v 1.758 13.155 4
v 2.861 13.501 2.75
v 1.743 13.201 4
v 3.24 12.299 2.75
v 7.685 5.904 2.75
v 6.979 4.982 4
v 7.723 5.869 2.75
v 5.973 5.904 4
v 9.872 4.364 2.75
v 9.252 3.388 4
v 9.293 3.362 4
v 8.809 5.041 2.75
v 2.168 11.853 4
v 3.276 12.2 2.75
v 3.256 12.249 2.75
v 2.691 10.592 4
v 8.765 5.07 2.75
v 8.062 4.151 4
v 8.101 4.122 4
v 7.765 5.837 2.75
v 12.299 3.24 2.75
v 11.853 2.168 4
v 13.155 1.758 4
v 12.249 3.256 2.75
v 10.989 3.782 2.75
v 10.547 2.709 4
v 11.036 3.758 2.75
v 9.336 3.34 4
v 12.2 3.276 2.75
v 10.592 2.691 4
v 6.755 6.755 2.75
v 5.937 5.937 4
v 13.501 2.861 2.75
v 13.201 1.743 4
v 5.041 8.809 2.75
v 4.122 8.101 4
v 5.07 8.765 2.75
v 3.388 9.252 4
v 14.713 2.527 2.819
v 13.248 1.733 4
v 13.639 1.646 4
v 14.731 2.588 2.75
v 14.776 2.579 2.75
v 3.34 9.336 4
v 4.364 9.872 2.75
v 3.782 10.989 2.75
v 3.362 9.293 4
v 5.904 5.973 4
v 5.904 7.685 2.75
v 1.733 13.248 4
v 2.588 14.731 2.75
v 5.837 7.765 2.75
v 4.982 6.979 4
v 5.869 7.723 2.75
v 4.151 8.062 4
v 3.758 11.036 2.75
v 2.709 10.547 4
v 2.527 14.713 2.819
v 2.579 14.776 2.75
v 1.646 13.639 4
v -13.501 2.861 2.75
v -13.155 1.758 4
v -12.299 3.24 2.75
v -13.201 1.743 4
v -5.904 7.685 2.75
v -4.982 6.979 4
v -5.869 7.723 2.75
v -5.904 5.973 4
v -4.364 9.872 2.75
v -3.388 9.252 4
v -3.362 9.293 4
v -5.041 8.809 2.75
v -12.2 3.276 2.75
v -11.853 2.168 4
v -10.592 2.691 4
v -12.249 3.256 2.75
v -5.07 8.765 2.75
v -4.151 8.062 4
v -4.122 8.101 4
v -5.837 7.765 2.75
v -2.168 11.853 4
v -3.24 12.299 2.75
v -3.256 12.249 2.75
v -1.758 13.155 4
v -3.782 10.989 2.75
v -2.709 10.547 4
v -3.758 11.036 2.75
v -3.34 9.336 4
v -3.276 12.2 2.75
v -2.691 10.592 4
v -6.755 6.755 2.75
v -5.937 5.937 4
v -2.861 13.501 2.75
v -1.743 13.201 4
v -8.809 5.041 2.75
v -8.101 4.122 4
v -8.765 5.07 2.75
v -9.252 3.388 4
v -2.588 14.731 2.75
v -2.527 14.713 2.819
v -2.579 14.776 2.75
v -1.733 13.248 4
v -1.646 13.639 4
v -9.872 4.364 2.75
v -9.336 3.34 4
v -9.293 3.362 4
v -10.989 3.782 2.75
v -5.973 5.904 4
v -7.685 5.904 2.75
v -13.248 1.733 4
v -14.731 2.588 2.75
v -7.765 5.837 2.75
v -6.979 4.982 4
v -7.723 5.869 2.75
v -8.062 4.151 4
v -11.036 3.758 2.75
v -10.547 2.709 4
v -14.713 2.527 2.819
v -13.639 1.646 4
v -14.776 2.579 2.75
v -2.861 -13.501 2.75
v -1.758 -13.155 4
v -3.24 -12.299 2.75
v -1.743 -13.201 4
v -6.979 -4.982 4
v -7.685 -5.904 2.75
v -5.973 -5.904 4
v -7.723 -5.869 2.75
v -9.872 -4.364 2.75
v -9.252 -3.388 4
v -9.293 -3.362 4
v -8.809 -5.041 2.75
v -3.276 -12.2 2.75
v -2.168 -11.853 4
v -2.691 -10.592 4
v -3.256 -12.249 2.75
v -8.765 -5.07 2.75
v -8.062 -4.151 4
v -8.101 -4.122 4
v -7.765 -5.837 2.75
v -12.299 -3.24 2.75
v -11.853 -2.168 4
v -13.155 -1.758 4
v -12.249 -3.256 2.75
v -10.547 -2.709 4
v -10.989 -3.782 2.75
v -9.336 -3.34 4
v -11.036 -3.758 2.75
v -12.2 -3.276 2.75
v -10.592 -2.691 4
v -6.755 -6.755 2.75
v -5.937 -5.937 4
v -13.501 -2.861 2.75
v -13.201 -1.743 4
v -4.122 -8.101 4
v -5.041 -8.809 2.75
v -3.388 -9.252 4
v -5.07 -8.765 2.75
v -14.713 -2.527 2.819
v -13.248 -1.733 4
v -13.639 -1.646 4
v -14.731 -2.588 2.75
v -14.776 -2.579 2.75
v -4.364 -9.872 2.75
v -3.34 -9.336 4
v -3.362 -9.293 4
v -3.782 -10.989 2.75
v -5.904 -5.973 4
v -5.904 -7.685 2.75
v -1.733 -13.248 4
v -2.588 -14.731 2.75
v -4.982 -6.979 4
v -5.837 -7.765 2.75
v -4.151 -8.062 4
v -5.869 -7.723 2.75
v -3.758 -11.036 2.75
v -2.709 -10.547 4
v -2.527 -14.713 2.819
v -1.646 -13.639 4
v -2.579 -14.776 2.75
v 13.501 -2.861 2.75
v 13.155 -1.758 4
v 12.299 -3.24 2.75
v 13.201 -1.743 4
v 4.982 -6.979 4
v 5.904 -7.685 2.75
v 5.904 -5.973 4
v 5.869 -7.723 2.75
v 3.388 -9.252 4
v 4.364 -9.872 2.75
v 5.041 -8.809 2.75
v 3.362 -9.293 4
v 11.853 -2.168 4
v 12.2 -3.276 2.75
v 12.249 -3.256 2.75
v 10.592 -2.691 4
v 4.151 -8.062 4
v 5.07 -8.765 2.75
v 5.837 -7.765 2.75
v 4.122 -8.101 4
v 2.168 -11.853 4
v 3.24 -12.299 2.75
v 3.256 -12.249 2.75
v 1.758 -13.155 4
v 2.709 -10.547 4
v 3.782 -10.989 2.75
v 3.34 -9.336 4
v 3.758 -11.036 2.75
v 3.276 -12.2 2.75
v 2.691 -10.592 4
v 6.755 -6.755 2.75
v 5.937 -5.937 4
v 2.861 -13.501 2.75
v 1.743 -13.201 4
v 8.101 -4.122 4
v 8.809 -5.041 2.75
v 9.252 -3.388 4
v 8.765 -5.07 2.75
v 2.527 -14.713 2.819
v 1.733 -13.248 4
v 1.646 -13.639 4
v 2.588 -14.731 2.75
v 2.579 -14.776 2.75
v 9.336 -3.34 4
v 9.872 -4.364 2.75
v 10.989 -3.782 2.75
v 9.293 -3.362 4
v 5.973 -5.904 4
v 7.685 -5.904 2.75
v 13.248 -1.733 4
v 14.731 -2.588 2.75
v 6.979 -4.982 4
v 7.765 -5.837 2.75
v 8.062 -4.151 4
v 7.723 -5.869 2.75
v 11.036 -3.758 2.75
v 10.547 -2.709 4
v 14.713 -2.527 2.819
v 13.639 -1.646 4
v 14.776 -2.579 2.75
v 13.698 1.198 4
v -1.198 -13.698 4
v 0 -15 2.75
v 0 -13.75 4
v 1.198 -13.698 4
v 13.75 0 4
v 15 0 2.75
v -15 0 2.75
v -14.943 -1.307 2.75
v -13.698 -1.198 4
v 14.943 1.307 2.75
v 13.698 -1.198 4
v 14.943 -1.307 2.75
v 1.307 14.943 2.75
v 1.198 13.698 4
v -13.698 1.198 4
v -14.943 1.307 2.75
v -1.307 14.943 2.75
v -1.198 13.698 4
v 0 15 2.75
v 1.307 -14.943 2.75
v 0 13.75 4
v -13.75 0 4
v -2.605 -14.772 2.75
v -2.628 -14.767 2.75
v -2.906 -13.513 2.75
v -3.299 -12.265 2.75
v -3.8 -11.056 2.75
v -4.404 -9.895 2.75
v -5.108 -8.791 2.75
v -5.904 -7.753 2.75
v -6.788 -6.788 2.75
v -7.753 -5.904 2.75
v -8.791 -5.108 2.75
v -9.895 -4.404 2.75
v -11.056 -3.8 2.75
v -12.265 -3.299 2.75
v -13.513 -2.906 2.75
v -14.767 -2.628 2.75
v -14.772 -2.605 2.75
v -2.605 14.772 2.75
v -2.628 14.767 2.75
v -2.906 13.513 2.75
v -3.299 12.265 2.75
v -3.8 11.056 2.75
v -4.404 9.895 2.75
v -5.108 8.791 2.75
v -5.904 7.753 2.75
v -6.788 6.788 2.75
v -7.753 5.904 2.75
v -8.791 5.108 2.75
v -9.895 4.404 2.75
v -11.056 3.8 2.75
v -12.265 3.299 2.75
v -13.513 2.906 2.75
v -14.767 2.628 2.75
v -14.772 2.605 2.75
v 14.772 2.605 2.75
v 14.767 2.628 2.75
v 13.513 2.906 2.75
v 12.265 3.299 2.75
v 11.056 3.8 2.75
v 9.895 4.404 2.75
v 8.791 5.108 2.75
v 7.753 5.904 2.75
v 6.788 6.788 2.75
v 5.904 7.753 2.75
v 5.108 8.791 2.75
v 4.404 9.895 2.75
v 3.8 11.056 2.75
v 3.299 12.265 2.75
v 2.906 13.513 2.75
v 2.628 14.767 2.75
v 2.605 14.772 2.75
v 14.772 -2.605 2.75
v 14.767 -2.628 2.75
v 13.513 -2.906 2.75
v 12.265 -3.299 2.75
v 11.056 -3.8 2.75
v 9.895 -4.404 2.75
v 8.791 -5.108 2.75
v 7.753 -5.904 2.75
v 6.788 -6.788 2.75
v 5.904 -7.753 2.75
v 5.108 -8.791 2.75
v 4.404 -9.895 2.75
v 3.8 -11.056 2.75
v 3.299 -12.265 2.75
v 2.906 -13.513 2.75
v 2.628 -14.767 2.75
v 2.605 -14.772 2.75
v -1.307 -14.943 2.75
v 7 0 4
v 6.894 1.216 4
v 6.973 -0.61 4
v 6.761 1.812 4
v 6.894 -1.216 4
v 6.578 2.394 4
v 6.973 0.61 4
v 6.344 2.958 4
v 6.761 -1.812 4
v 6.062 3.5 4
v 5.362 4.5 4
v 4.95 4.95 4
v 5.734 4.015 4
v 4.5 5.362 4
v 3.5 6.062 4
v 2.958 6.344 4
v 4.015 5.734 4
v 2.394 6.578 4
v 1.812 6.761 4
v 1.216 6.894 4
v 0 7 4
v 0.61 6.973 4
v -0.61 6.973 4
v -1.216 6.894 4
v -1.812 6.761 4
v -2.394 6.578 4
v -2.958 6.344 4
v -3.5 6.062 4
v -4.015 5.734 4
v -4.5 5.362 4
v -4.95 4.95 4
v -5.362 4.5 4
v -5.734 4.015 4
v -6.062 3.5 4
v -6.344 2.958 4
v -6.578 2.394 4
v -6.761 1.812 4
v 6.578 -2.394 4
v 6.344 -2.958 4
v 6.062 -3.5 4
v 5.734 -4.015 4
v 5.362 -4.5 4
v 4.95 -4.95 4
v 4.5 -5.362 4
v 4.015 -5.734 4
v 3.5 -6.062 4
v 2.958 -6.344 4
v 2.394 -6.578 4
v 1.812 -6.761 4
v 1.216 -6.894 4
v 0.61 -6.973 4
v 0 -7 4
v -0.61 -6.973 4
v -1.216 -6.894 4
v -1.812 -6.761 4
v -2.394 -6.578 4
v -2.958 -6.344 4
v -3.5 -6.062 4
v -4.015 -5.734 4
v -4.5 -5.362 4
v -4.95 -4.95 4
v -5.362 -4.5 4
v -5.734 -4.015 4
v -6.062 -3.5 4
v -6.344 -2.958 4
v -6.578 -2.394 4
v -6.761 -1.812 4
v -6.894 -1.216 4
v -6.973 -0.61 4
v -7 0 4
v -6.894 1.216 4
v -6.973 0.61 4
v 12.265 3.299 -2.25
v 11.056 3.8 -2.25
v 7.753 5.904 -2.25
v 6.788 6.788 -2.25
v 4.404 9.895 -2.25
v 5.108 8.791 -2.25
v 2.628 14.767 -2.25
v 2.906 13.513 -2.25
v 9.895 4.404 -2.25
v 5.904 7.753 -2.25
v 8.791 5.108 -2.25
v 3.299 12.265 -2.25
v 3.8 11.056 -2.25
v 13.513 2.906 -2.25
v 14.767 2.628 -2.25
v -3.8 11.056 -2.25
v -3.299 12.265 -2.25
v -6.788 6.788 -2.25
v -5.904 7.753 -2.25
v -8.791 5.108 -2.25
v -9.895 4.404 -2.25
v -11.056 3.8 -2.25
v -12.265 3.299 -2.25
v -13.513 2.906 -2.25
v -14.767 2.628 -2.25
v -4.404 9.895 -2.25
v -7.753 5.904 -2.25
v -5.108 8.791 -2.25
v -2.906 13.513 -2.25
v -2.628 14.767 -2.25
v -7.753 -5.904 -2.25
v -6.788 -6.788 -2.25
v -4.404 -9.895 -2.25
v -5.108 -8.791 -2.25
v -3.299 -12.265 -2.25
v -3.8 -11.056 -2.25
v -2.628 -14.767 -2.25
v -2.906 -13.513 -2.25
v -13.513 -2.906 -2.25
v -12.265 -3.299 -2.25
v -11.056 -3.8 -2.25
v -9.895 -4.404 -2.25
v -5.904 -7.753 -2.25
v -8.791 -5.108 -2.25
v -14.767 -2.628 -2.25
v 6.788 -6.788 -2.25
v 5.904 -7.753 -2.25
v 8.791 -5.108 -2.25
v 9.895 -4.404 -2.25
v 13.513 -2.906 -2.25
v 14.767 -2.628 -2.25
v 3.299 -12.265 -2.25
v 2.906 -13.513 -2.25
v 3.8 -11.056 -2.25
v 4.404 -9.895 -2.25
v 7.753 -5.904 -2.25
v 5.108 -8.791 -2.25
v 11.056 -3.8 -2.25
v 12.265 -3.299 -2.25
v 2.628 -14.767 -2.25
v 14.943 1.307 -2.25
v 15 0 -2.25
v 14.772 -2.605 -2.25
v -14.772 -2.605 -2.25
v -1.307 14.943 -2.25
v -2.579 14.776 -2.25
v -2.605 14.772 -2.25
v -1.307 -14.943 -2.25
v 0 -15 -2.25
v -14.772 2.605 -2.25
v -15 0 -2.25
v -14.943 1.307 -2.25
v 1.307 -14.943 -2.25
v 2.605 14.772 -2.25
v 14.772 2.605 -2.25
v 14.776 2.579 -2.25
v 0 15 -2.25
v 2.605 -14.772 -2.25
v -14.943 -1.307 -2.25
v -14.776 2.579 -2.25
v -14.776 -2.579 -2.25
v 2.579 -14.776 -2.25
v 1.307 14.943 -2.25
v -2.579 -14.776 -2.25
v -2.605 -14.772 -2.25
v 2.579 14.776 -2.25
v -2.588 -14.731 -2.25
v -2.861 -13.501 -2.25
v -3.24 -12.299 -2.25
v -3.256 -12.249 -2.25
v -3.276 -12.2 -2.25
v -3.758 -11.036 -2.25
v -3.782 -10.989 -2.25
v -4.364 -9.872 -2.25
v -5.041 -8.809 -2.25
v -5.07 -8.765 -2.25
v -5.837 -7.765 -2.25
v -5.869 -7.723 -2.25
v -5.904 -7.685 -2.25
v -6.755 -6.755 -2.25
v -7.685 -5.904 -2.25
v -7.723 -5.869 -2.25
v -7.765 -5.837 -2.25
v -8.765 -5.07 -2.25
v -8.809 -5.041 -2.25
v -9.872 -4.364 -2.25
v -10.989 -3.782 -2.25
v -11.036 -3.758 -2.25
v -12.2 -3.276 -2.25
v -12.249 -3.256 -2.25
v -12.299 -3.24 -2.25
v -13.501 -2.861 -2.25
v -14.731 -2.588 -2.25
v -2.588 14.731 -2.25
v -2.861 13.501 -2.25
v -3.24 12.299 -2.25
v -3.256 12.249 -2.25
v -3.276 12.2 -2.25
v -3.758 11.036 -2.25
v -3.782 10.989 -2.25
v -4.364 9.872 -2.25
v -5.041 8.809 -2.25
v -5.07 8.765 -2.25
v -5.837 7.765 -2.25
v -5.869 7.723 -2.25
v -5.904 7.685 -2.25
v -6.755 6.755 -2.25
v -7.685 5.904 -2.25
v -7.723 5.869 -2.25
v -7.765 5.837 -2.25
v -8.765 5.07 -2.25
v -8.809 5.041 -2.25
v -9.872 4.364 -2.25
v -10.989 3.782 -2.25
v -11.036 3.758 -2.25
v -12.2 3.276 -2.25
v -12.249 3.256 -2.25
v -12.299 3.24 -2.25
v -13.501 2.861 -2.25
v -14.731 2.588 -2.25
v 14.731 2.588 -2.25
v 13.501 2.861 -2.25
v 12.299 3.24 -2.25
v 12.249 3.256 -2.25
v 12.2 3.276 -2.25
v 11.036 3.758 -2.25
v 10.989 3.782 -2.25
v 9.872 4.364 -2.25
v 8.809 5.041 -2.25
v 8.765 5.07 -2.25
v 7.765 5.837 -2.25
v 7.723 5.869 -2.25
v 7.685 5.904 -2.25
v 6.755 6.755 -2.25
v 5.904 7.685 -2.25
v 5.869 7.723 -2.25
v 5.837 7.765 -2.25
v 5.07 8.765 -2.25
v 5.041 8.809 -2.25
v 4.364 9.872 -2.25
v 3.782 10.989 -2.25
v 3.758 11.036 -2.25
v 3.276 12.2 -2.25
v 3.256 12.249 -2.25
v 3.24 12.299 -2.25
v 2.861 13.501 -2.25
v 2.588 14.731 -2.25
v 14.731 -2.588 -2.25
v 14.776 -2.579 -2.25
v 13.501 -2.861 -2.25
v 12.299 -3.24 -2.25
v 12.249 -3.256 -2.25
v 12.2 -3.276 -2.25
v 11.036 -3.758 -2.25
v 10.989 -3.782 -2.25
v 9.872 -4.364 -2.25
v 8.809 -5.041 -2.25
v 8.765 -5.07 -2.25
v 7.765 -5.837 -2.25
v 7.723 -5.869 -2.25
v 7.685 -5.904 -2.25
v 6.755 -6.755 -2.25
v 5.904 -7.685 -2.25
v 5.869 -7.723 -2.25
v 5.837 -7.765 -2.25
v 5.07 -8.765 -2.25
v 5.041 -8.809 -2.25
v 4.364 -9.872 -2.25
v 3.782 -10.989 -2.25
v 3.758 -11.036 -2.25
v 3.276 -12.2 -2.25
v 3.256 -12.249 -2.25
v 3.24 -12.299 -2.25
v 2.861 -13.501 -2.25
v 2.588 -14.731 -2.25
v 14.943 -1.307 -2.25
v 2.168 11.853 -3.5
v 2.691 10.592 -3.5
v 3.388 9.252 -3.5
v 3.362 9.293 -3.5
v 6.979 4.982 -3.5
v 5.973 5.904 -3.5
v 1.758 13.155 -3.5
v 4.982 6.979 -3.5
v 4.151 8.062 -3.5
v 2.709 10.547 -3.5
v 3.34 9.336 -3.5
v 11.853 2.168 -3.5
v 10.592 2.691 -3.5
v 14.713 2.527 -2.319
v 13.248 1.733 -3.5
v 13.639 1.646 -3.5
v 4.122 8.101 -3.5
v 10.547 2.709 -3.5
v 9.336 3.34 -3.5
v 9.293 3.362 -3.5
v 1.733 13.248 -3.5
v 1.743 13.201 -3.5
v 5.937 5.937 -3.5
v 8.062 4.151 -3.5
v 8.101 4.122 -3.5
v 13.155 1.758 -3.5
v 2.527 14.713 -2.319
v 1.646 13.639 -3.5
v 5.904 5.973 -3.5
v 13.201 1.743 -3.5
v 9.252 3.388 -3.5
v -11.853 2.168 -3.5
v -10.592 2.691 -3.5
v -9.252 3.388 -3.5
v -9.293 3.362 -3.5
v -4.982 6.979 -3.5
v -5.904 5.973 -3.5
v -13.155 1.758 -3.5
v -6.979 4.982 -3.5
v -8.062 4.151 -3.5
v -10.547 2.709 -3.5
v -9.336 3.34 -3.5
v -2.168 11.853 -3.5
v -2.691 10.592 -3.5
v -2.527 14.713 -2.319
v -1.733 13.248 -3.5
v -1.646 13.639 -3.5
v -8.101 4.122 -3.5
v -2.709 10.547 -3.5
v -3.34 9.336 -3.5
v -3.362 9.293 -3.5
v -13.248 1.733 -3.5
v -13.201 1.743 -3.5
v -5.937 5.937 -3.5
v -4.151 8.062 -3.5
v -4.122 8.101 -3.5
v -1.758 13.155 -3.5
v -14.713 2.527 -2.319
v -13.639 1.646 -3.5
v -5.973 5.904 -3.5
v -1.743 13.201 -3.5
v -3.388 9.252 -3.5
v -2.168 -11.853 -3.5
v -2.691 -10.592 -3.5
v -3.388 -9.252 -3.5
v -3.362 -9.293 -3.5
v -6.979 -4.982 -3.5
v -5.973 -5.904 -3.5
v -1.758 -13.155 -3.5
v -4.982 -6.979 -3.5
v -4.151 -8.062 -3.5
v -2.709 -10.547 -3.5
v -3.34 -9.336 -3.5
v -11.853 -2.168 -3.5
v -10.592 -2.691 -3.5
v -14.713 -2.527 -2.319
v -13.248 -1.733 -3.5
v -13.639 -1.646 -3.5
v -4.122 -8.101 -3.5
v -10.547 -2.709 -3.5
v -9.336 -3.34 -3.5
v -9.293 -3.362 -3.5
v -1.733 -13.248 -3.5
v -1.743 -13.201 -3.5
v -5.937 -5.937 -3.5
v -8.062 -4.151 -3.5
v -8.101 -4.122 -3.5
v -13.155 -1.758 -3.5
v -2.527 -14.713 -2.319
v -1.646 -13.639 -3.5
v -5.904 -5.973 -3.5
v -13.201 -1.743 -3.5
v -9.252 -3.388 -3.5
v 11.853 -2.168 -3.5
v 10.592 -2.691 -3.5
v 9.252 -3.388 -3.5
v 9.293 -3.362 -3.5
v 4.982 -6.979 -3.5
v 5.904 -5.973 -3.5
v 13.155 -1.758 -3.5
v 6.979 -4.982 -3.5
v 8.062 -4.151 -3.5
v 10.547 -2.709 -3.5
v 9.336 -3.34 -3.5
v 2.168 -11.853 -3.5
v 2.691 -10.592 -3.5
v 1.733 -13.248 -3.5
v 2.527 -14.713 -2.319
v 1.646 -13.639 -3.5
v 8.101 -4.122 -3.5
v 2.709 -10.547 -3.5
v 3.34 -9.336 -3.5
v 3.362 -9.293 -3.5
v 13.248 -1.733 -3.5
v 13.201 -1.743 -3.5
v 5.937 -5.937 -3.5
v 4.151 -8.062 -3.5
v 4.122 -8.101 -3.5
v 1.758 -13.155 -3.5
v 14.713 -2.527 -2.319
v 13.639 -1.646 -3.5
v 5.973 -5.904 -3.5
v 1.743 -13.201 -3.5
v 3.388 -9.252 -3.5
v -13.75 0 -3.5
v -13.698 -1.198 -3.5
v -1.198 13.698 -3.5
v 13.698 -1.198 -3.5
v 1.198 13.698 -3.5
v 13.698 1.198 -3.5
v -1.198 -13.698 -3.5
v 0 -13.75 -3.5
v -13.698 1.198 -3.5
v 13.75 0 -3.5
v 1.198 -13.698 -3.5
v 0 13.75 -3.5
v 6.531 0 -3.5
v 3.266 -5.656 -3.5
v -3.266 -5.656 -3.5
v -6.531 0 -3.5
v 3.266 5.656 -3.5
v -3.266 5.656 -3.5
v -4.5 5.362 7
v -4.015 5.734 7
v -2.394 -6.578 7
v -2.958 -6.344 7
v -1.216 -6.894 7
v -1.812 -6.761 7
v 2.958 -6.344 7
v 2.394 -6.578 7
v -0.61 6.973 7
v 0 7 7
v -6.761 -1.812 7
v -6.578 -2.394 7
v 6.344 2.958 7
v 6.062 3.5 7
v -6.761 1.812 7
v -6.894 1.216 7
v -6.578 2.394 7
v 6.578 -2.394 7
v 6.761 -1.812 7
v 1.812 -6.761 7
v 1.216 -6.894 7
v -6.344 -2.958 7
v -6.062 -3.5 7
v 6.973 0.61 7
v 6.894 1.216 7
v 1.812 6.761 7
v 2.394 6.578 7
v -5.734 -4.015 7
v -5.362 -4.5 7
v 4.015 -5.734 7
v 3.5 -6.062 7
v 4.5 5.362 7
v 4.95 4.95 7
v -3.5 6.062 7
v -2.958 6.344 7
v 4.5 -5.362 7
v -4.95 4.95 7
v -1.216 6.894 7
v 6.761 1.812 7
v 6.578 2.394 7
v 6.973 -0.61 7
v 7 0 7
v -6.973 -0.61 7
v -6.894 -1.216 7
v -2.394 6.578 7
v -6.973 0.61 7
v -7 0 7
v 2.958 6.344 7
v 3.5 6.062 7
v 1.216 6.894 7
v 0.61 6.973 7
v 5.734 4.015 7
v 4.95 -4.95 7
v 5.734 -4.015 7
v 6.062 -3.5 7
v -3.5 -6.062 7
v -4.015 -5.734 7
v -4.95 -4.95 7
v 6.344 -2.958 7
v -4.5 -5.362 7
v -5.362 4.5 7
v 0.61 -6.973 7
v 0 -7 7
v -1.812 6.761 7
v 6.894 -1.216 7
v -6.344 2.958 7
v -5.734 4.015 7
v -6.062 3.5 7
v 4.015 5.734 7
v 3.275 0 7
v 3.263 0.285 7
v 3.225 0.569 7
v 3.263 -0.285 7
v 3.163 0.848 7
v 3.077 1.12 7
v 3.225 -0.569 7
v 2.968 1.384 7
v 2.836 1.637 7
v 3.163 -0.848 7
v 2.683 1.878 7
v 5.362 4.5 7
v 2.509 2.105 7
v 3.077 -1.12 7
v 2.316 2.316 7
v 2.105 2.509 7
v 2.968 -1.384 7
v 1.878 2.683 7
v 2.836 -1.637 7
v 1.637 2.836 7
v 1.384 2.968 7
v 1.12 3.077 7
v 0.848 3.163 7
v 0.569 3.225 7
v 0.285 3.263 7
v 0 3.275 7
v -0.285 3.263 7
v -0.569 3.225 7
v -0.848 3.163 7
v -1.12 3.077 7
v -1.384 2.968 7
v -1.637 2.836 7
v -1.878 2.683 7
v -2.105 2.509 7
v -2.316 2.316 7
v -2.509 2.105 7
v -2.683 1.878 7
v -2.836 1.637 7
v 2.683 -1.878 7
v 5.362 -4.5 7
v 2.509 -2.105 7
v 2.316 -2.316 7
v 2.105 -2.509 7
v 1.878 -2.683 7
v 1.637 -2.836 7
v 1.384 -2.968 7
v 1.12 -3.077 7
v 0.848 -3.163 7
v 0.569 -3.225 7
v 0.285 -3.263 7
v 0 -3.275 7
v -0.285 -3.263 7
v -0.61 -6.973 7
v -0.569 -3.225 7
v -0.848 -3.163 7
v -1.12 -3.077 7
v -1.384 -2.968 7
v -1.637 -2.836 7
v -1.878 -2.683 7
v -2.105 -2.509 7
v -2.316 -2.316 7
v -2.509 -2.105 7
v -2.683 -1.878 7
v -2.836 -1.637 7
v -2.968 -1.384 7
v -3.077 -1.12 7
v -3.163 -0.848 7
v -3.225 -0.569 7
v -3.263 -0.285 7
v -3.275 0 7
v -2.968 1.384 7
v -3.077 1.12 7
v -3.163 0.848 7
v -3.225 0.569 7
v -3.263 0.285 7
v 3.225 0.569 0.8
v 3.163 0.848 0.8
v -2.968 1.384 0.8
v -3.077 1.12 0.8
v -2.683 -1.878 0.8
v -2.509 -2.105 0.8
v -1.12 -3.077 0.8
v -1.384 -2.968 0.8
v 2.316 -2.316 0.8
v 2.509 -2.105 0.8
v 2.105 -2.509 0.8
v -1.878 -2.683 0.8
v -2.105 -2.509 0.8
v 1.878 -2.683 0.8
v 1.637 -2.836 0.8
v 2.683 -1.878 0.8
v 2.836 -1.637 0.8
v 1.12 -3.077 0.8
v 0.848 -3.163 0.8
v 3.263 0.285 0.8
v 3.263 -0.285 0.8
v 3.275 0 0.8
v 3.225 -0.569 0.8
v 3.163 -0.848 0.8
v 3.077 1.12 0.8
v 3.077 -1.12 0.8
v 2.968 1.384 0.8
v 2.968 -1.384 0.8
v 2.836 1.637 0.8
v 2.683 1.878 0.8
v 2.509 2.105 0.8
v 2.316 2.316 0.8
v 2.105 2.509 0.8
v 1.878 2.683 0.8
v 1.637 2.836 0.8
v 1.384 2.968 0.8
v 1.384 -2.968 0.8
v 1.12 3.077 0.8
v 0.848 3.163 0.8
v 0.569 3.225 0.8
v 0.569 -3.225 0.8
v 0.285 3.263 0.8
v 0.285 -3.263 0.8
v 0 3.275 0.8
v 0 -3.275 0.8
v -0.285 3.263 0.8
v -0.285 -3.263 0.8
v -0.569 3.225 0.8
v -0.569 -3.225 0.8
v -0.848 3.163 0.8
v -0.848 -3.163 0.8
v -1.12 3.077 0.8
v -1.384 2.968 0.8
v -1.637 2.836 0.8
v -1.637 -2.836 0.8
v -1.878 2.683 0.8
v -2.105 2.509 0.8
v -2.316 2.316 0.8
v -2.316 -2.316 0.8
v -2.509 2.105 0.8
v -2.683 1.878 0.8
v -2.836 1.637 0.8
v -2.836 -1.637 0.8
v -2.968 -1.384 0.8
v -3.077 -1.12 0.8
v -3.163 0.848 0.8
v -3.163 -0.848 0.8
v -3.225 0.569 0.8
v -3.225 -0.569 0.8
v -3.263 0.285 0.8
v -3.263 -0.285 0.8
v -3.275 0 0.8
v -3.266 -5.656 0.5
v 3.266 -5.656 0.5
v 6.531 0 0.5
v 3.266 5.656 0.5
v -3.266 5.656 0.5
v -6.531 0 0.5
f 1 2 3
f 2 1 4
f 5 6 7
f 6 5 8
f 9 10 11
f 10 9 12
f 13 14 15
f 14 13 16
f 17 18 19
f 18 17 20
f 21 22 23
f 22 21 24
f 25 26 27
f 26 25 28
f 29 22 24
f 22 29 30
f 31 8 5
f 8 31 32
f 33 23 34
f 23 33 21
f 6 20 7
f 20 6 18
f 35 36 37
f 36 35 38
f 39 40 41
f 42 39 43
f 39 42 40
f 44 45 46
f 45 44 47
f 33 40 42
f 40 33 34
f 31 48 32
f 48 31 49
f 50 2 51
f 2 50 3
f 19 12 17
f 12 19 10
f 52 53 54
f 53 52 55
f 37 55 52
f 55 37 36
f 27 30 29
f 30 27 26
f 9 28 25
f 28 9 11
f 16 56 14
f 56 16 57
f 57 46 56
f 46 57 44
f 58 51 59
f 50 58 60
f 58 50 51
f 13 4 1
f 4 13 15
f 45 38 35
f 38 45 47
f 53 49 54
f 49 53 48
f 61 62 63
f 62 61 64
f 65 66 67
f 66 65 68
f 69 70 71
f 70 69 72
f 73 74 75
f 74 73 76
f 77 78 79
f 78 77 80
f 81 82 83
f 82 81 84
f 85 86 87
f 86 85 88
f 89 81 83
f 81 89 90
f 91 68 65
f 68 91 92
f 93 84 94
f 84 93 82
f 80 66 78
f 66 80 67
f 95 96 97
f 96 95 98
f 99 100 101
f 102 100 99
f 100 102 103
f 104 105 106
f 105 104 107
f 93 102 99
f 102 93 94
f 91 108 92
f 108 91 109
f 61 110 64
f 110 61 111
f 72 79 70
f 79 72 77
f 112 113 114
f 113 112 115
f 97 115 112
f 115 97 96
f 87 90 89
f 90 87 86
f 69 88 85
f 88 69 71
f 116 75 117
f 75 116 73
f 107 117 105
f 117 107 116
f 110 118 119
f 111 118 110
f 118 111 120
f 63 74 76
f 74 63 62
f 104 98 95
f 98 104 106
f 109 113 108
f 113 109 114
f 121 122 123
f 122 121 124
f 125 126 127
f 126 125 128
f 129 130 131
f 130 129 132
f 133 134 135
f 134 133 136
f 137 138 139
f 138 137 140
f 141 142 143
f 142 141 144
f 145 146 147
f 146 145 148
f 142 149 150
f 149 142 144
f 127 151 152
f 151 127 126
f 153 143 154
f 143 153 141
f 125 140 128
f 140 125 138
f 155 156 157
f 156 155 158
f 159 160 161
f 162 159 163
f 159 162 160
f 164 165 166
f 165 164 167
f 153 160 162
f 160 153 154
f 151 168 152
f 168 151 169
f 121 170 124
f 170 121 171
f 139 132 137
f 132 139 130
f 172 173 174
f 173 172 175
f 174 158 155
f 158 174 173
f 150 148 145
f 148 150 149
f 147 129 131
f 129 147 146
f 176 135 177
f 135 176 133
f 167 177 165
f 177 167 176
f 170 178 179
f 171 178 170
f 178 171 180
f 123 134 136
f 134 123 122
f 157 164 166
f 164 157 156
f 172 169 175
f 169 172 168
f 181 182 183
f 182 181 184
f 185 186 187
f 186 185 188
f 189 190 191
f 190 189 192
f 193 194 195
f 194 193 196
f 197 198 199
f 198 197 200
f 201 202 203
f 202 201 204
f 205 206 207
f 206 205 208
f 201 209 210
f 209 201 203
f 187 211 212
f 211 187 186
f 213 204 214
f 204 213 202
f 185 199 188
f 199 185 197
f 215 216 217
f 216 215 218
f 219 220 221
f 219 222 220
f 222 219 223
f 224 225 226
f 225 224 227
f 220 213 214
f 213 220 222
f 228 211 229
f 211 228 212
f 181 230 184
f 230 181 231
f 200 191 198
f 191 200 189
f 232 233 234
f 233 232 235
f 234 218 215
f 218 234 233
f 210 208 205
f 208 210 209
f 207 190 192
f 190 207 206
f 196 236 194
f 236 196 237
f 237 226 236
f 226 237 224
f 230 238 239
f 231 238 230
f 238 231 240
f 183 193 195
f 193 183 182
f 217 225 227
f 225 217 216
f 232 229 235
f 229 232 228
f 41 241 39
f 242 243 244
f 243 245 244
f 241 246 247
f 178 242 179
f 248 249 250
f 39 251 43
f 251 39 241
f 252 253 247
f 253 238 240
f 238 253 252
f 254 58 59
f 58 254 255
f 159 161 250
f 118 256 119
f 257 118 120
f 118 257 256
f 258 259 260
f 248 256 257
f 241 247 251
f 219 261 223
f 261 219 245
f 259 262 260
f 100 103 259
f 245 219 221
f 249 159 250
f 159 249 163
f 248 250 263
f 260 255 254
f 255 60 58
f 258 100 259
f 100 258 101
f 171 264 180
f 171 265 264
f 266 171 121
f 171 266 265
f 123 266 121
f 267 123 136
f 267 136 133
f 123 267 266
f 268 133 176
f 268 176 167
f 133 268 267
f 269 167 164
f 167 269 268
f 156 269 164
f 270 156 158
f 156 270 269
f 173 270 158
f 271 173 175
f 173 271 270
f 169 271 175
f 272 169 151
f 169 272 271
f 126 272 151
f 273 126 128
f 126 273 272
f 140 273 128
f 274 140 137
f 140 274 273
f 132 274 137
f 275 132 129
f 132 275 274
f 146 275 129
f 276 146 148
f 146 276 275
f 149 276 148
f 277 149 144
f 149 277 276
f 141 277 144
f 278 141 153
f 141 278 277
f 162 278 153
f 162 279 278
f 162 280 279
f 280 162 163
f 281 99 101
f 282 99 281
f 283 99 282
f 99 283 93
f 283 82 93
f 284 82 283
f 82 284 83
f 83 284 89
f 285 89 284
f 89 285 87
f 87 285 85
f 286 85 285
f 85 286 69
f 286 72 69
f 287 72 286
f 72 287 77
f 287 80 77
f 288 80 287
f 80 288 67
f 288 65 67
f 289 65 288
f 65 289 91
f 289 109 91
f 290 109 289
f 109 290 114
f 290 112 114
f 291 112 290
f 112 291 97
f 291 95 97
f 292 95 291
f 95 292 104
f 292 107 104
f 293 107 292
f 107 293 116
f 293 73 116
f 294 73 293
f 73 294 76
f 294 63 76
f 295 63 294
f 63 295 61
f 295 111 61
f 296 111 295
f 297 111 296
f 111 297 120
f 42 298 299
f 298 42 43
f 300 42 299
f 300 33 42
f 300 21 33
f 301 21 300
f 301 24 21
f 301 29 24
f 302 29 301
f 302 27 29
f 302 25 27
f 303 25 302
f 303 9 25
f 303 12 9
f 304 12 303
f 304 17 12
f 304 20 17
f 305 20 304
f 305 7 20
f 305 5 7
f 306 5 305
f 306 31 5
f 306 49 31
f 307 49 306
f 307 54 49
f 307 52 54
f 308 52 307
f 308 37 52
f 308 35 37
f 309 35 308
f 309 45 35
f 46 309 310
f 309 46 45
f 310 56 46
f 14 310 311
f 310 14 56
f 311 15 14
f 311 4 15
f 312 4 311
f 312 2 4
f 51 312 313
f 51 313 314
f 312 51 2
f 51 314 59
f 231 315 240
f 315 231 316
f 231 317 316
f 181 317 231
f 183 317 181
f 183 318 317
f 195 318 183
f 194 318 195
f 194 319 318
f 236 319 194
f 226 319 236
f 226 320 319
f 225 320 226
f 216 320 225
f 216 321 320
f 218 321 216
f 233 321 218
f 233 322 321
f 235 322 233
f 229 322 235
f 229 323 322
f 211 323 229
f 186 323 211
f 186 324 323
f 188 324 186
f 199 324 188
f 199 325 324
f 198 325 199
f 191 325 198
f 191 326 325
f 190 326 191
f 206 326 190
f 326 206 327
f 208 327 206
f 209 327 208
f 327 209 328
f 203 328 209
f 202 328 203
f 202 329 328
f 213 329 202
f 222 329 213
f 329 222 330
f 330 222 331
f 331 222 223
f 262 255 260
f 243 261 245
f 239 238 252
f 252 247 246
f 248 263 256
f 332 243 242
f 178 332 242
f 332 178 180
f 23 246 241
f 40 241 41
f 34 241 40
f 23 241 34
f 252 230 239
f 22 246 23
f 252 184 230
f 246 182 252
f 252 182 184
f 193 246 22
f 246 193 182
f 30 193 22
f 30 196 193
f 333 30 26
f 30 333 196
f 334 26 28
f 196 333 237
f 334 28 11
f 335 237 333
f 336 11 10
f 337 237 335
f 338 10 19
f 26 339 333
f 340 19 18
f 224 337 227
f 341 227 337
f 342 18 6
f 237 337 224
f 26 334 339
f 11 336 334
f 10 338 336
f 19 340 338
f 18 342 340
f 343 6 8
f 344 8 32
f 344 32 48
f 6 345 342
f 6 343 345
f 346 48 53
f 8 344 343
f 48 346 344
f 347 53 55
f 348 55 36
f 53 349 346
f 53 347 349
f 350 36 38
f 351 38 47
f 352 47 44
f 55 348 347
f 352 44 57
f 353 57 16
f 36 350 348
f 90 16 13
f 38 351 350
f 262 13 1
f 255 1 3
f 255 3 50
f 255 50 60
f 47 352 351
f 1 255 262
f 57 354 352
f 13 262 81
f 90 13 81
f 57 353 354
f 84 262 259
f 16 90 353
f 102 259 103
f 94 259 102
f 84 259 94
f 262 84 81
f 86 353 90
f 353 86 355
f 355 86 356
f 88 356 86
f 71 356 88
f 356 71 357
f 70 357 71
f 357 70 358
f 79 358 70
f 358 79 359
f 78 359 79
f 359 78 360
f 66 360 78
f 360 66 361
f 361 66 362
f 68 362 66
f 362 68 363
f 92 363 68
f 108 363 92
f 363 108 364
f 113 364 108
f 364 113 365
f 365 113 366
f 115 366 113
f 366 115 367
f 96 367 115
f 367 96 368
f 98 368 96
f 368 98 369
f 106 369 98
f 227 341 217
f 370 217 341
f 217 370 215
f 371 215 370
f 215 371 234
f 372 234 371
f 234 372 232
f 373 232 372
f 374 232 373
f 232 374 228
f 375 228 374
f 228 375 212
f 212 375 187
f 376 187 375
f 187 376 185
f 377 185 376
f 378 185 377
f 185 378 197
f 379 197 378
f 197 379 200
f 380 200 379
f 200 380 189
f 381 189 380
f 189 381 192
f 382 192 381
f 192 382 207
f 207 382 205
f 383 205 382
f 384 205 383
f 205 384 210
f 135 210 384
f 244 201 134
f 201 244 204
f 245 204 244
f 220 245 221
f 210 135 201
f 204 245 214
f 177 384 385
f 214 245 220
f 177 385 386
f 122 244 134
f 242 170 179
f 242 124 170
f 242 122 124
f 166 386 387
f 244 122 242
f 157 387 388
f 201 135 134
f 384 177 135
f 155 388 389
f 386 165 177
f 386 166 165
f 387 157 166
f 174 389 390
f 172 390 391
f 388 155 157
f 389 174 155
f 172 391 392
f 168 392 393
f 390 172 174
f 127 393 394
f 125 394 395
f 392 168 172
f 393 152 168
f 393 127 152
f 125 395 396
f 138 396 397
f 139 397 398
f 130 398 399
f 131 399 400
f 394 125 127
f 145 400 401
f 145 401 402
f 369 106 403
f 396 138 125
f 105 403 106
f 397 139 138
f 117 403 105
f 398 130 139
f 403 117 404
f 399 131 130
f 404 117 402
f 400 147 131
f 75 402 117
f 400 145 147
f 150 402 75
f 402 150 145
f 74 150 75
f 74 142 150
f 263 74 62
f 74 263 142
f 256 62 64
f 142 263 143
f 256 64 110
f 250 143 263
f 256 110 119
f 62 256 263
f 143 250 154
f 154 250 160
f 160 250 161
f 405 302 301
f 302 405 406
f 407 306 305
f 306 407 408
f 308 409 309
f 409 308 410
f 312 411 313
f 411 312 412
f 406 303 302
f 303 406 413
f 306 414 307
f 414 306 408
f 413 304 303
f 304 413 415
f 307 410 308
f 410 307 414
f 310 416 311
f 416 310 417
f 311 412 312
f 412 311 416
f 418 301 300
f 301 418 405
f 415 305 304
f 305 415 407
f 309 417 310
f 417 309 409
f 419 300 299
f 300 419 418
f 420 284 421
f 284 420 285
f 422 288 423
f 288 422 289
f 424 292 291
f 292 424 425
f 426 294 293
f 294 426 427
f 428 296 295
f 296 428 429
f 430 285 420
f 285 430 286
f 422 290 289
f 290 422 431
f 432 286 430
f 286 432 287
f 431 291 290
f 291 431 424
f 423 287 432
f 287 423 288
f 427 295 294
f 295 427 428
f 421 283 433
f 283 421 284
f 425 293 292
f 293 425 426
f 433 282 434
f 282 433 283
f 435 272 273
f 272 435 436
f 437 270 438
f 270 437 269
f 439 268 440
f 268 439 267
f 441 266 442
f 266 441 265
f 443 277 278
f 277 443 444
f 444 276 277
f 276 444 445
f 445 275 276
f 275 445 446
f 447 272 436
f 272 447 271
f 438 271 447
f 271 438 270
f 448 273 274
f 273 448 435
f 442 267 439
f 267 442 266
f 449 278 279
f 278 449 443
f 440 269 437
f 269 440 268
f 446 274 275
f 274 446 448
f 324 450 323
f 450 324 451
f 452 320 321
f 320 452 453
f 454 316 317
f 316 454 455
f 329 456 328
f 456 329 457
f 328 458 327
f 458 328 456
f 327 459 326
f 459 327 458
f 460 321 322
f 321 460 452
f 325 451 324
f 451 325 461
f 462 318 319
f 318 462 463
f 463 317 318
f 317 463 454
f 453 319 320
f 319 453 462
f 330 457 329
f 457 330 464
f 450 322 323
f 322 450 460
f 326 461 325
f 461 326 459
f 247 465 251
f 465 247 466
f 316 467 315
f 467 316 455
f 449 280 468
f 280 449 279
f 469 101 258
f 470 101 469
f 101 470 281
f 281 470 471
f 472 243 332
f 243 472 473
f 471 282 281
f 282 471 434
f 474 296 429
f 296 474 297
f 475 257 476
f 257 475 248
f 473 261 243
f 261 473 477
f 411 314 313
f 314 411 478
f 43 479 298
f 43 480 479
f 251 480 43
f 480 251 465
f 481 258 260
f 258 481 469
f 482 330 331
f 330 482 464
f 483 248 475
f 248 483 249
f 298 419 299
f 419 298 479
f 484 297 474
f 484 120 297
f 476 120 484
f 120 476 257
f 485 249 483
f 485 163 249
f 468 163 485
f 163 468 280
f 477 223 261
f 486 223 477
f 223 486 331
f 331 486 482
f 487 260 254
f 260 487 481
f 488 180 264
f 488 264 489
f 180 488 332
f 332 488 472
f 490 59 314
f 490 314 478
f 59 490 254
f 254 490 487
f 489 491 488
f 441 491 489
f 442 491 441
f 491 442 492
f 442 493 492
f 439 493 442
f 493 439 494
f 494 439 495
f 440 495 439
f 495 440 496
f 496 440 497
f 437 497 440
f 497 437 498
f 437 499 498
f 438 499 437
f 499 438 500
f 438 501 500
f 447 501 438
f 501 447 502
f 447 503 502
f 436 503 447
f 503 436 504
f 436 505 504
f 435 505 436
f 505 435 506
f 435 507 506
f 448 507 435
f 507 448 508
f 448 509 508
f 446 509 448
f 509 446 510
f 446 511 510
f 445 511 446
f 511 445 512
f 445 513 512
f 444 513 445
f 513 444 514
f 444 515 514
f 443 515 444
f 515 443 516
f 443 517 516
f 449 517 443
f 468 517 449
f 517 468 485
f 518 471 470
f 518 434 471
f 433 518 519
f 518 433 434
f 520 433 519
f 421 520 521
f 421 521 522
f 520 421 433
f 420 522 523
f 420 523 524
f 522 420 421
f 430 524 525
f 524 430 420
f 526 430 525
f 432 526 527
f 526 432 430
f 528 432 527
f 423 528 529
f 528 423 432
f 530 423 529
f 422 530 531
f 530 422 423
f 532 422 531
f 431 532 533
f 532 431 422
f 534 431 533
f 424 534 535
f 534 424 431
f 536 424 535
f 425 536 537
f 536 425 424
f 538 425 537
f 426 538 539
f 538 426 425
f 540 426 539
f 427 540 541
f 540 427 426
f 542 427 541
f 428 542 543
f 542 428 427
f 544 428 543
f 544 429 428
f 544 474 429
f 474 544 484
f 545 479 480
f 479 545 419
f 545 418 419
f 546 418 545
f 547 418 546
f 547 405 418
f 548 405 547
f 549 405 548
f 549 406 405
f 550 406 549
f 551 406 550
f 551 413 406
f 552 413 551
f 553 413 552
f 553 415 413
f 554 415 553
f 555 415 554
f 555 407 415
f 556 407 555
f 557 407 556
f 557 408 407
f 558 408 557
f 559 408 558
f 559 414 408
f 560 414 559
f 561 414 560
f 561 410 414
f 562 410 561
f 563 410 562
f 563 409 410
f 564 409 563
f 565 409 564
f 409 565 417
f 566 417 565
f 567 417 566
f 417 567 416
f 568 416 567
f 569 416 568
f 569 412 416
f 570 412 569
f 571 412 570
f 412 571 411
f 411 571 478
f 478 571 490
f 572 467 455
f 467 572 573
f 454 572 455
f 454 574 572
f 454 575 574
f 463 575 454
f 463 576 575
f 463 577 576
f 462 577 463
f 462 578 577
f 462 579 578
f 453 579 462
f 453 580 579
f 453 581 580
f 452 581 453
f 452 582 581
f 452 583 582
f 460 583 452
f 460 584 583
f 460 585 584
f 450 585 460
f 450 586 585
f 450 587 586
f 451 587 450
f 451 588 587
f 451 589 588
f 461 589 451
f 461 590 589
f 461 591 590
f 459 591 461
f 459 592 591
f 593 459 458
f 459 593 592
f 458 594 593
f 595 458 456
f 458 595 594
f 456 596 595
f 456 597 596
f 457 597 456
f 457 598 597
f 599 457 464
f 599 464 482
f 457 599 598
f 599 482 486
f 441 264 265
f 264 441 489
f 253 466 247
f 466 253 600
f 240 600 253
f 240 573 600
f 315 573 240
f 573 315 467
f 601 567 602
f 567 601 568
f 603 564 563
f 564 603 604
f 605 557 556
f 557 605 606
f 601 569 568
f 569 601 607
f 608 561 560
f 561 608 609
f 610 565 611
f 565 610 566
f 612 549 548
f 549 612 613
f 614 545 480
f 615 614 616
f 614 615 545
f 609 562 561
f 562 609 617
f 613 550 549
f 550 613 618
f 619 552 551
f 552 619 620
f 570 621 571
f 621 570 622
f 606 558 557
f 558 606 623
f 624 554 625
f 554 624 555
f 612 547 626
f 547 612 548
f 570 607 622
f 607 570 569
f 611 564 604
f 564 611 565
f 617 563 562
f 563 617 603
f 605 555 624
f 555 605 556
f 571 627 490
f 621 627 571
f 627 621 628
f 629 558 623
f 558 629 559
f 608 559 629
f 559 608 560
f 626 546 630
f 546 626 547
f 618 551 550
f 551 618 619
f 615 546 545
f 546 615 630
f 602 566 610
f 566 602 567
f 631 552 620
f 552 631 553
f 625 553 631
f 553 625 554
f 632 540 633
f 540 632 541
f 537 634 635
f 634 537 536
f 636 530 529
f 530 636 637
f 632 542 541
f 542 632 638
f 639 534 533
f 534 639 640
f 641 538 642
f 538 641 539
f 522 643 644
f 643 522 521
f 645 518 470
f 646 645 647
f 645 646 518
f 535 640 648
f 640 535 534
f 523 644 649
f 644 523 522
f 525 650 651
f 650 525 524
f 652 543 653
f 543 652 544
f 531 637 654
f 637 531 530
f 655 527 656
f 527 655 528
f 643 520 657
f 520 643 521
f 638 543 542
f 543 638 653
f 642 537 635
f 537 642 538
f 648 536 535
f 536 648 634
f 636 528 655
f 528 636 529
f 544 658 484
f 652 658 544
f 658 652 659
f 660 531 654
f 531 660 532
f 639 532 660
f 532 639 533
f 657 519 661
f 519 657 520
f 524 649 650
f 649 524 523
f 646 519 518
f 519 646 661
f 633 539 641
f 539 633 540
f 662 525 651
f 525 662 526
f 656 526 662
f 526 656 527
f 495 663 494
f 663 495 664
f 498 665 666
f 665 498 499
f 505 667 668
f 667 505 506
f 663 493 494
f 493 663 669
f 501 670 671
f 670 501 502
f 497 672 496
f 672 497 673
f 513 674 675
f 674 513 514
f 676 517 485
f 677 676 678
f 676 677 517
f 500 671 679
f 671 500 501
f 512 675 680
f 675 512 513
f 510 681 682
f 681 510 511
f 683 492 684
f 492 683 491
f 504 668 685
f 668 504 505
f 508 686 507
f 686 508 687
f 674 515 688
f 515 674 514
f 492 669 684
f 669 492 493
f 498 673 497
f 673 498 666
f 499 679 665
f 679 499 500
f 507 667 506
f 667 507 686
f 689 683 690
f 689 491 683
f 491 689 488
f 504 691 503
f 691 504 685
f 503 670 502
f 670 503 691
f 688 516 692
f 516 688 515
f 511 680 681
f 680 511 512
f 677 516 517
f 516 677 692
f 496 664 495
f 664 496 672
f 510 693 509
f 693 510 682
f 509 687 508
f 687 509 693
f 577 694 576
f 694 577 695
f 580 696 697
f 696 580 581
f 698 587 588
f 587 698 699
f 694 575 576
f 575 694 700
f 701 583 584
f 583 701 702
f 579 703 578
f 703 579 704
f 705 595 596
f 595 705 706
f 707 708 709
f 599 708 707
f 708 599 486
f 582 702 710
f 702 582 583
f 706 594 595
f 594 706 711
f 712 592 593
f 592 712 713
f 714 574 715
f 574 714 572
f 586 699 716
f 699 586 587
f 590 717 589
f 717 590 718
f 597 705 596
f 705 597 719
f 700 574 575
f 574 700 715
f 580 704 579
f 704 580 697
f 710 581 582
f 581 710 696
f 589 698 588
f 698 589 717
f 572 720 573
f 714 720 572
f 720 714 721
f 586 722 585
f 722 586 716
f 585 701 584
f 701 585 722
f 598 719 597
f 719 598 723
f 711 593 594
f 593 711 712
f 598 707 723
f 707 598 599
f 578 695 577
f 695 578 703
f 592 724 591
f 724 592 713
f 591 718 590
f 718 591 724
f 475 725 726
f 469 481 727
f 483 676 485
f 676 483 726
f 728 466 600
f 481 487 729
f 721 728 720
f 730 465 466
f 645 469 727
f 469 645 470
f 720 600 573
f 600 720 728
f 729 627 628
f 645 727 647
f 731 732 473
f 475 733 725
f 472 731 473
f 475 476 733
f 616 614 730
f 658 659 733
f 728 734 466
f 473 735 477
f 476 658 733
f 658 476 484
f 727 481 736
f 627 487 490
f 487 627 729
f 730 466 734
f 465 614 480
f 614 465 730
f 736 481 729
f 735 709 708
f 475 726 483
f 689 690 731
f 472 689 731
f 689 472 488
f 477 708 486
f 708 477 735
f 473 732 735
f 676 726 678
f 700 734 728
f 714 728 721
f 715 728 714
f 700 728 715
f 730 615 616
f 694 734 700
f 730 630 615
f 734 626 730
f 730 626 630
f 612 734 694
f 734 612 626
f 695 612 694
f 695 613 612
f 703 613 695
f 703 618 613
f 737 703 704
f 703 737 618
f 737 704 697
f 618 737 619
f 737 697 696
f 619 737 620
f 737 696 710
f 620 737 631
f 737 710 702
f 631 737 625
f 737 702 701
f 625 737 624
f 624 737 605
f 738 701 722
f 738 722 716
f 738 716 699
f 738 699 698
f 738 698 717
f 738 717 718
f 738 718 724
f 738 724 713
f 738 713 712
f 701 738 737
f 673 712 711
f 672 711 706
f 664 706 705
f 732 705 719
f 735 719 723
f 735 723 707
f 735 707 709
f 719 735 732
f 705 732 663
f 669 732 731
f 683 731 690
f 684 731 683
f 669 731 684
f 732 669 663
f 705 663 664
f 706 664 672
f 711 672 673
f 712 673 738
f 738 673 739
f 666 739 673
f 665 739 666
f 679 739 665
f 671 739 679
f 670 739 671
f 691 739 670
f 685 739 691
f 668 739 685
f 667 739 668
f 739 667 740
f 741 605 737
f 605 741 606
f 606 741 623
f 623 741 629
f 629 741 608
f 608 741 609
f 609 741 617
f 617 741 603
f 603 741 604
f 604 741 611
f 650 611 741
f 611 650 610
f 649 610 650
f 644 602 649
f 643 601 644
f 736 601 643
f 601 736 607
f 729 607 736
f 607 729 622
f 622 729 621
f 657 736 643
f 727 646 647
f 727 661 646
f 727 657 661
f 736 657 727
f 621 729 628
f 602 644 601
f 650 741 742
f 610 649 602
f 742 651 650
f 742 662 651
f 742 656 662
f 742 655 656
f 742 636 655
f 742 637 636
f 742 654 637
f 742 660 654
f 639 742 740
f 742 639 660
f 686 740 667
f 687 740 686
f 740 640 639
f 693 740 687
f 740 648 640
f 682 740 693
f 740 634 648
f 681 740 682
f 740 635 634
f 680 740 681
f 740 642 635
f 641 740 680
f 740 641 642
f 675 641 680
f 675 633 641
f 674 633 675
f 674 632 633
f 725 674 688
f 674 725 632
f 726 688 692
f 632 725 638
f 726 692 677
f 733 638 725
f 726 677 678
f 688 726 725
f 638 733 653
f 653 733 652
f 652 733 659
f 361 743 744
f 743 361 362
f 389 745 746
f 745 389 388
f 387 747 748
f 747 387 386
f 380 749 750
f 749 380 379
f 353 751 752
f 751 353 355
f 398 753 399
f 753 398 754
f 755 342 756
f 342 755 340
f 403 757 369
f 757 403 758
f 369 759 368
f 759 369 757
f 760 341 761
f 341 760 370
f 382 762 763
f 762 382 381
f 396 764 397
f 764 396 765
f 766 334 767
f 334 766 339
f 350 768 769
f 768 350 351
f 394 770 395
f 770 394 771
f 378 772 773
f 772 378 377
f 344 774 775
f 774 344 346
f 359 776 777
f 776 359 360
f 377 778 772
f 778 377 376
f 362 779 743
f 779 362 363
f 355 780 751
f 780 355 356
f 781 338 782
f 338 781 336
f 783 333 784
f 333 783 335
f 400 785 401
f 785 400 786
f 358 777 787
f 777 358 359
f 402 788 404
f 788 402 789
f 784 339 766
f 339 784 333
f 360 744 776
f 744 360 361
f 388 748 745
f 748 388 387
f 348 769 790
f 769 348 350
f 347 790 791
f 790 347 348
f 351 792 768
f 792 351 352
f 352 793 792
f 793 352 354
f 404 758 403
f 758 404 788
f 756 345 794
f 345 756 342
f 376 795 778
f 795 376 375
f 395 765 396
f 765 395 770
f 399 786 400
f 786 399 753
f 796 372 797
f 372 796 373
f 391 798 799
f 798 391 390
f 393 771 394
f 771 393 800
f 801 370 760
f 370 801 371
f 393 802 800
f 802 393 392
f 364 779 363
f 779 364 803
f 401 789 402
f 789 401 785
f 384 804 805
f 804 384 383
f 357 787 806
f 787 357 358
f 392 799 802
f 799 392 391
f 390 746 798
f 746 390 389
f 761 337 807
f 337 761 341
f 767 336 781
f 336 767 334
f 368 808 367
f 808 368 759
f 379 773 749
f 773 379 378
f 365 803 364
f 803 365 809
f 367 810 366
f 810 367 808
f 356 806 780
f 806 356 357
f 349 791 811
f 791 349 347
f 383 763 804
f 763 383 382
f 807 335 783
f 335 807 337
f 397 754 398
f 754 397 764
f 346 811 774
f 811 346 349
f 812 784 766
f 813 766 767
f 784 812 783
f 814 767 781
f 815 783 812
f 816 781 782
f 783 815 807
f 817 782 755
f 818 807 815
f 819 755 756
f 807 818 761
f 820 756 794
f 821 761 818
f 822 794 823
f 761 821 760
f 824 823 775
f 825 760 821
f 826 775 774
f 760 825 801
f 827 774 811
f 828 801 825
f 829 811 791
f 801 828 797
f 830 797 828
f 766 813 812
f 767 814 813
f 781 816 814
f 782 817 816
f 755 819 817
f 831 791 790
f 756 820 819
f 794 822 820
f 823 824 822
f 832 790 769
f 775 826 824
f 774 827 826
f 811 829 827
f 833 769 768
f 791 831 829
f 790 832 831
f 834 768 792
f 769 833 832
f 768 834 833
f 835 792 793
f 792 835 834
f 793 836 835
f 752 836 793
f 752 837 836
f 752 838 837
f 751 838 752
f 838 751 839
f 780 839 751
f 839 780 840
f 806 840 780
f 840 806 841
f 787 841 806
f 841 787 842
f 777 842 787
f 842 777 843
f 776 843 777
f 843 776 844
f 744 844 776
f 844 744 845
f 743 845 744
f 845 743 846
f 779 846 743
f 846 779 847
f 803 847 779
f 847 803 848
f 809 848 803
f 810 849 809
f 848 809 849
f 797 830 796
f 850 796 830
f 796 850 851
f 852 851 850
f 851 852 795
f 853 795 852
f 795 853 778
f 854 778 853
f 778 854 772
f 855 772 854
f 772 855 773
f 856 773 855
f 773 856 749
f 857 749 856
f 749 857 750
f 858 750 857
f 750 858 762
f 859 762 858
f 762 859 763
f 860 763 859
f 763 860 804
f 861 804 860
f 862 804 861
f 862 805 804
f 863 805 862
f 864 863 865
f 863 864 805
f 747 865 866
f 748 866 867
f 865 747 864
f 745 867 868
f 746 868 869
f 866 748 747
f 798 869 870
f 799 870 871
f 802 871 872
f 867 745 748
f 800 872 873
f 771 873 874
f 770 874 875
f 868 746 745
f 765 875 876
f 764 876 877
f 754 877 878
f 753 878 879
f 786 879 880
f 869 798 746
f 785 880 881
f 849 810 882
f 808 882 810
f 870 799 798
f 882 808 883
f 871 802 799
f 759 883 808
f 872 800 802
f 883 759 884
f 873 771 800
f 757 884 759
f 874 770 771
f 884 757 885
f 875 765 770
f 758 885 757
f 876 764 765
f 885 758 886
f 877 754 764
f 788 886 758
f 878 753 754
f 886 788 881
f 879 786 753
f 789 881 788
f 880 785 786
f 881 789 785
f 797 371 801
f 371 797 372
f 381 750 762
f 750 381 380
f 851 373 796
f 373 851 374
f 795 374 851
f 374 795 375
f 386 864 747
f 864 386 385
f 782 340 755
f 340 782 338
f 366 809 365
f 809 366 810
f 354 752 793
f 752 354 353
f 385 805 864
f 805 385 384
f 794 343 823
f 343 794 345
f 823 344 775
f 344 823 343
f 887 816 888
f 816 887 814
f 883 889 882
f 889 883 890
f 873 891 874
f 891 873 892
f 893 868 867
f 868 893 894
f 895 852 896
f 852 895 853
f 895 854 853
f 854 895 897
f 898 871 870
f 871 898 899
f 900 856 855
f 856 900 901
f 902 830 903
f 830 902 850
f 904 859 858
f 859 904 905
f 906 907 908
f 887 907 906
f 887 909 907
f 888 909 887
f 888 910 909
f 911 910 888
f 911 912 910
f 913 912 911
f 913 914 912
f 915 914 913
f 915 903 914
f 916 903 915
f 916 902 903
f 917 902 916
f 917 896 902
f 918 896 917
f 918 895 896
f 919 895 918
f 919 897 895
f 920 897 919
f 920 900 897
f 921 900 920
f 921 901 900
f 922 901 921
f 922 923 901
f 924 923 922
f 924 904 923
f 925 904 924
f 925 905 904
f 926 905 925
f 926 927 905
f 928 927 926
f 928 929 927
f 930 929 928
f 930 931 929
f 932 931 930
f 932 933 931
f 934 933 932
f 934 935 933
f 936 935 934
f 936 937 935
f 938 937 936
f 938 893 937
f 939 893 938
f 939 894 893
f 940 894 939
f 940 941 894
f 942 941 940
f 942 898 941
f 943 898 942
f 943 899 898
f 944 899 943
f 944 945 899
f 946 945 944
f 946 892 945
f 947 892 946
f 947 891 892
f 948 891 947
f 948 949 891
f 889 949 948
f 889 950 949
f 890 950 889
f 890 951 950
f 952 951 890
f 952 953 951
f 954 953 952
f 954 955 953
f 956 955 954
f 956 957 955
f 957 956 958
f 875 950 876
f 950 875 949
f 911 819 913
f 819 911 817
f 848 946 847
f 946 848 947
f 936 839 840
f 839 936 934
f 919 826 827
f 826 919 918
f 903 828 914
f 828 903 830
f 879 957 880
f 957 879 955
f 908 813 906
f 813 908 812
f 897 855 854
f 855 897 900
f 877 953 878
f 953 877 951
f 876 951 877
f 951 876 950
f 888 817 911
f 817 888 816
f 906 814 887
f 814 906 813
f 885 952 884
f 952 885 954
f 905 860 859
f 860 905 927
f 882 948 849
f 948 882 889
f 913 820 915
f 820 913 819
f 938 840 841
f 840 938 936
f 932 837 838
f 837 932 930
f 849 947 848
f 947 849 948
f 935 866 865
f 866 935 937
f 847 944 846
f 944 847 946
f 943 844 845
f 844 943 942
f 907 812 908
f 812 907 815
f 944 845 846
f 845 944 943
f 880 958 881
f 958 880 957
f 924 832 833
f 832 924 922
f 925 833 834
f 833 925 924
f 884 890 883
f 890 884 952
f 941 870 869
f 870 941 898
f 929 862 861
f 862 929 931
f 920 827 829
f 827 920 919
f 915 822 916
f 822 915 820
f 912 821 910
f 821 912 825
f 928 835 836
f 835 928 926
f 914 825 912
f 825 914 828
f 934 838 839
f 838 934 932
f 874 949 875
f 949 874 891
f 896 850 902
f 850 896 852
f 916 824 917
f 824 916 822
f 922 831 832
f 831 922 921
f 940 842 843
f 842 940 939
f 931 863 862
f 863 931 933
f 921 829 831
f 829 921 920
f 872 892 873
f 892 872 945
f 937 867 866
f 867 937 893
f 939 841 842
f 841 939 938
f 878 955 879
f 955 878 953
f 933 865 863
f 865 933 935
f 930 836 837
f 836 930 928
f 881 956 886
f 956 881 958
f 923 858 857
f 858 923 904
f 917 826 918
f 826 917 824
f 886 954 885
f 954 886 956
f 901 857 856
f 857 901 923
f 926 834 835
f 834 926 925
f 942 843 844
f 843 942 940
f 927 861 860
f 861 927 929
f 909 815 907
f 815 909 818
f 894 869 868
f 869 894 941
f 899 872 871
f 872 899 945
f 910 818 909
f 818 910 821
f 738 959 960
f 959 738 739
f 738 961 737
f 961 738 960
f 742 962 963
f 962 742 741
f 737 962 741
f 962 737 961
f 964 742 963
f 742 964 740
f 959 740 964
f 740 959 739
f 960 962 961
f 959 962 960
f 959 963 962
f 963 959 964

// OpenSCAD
/*
FingerGrip for HexHeadScrew (c) by Lukas Süss (2013)

FingerGrip for HexHeadScrew is licensed under a
Creative Commons Attribution 3.0 Unported License.

You should have received a copy of the license along with this
work.  If not, see <http://creativecommons.org/licenses/by/3.0/>.
*/



// outer diameter of screw thread (default: Fotoscrew 1/4''+ 0.2mm clearing)
dscrew = 6.55;
// wrench width (default: Fotoscrew 7/16''+ 0.2mm clearing)
sscrewhead = 11.3125;
// hight of head (default: Fotoscrew 4mm) only used for thinn designs
hscrewhead = 4;

// hight of grip without protrusion
hgrip = 7.5;
// outermost diameter of grip
dgrip = 30;
// how much sould the edge be broken
bevel = 1.25;
// hight of protrusion
hprotrus = 3;
// how far to shift the fingerdents outward (in %)
shift = 82; //  [80.0:100.0]


eps=0.05*1;
$fa=5*1;
$fs=0.2*1;

screwhead(hgrip,dgrip,bevel);


module screwhead(hknob,dknob,t) // f=0.85
{
  translate([0,0,hscrewhead]) scale([1,1,-1])
  difference()
  {
    rotate(45*1,[0,0,1]) //screw retainment? glue?  <<<< ??
    union()
    { 
      translate([0,0,0]) screwheadbasebody(t,dknob,t,0);
      translate([0,0,t]) screwheadbasebody(hknob-2*t,dknob,0,0);
      translate([0,0,hknob-t]) screwheadbasebody(t,dknob,0,t);
      scale([1,1,-1]) cylinder(r=14/2,h=hprotrus);
    } 
    headcutter(hknob);
  }
}
module screwheadbasebody(hknob,dknob,t1,t2)
{
  difference()
  {
    union()
    {
      cylinder(h=hknob,r1=dknob/2-t1,r2=dknob/2-t2);
    }
    for(i=[0:3])
    {
      rotate(90*i+15*0,[0,0,1]) translate([dknob*shift/100,0,-eps])
        cylinder(h=hknob+2*eps,r1=dknob/2+t1,r2=dknob/2+t2);
    }
  }
}
module headcutter(hknob)
{
   translate([0,0,-hprotrus-0.3]) cylinder(h=hknob-hscrewhead+hprotrus,r=dscrew/2);
   translate([0,0,min(2*hscrewhead,hknob-hscrewhead)])
     cylinder(h=hknob*1.2,r=sscrewhead/2/cos(30),$fn=6);
}
